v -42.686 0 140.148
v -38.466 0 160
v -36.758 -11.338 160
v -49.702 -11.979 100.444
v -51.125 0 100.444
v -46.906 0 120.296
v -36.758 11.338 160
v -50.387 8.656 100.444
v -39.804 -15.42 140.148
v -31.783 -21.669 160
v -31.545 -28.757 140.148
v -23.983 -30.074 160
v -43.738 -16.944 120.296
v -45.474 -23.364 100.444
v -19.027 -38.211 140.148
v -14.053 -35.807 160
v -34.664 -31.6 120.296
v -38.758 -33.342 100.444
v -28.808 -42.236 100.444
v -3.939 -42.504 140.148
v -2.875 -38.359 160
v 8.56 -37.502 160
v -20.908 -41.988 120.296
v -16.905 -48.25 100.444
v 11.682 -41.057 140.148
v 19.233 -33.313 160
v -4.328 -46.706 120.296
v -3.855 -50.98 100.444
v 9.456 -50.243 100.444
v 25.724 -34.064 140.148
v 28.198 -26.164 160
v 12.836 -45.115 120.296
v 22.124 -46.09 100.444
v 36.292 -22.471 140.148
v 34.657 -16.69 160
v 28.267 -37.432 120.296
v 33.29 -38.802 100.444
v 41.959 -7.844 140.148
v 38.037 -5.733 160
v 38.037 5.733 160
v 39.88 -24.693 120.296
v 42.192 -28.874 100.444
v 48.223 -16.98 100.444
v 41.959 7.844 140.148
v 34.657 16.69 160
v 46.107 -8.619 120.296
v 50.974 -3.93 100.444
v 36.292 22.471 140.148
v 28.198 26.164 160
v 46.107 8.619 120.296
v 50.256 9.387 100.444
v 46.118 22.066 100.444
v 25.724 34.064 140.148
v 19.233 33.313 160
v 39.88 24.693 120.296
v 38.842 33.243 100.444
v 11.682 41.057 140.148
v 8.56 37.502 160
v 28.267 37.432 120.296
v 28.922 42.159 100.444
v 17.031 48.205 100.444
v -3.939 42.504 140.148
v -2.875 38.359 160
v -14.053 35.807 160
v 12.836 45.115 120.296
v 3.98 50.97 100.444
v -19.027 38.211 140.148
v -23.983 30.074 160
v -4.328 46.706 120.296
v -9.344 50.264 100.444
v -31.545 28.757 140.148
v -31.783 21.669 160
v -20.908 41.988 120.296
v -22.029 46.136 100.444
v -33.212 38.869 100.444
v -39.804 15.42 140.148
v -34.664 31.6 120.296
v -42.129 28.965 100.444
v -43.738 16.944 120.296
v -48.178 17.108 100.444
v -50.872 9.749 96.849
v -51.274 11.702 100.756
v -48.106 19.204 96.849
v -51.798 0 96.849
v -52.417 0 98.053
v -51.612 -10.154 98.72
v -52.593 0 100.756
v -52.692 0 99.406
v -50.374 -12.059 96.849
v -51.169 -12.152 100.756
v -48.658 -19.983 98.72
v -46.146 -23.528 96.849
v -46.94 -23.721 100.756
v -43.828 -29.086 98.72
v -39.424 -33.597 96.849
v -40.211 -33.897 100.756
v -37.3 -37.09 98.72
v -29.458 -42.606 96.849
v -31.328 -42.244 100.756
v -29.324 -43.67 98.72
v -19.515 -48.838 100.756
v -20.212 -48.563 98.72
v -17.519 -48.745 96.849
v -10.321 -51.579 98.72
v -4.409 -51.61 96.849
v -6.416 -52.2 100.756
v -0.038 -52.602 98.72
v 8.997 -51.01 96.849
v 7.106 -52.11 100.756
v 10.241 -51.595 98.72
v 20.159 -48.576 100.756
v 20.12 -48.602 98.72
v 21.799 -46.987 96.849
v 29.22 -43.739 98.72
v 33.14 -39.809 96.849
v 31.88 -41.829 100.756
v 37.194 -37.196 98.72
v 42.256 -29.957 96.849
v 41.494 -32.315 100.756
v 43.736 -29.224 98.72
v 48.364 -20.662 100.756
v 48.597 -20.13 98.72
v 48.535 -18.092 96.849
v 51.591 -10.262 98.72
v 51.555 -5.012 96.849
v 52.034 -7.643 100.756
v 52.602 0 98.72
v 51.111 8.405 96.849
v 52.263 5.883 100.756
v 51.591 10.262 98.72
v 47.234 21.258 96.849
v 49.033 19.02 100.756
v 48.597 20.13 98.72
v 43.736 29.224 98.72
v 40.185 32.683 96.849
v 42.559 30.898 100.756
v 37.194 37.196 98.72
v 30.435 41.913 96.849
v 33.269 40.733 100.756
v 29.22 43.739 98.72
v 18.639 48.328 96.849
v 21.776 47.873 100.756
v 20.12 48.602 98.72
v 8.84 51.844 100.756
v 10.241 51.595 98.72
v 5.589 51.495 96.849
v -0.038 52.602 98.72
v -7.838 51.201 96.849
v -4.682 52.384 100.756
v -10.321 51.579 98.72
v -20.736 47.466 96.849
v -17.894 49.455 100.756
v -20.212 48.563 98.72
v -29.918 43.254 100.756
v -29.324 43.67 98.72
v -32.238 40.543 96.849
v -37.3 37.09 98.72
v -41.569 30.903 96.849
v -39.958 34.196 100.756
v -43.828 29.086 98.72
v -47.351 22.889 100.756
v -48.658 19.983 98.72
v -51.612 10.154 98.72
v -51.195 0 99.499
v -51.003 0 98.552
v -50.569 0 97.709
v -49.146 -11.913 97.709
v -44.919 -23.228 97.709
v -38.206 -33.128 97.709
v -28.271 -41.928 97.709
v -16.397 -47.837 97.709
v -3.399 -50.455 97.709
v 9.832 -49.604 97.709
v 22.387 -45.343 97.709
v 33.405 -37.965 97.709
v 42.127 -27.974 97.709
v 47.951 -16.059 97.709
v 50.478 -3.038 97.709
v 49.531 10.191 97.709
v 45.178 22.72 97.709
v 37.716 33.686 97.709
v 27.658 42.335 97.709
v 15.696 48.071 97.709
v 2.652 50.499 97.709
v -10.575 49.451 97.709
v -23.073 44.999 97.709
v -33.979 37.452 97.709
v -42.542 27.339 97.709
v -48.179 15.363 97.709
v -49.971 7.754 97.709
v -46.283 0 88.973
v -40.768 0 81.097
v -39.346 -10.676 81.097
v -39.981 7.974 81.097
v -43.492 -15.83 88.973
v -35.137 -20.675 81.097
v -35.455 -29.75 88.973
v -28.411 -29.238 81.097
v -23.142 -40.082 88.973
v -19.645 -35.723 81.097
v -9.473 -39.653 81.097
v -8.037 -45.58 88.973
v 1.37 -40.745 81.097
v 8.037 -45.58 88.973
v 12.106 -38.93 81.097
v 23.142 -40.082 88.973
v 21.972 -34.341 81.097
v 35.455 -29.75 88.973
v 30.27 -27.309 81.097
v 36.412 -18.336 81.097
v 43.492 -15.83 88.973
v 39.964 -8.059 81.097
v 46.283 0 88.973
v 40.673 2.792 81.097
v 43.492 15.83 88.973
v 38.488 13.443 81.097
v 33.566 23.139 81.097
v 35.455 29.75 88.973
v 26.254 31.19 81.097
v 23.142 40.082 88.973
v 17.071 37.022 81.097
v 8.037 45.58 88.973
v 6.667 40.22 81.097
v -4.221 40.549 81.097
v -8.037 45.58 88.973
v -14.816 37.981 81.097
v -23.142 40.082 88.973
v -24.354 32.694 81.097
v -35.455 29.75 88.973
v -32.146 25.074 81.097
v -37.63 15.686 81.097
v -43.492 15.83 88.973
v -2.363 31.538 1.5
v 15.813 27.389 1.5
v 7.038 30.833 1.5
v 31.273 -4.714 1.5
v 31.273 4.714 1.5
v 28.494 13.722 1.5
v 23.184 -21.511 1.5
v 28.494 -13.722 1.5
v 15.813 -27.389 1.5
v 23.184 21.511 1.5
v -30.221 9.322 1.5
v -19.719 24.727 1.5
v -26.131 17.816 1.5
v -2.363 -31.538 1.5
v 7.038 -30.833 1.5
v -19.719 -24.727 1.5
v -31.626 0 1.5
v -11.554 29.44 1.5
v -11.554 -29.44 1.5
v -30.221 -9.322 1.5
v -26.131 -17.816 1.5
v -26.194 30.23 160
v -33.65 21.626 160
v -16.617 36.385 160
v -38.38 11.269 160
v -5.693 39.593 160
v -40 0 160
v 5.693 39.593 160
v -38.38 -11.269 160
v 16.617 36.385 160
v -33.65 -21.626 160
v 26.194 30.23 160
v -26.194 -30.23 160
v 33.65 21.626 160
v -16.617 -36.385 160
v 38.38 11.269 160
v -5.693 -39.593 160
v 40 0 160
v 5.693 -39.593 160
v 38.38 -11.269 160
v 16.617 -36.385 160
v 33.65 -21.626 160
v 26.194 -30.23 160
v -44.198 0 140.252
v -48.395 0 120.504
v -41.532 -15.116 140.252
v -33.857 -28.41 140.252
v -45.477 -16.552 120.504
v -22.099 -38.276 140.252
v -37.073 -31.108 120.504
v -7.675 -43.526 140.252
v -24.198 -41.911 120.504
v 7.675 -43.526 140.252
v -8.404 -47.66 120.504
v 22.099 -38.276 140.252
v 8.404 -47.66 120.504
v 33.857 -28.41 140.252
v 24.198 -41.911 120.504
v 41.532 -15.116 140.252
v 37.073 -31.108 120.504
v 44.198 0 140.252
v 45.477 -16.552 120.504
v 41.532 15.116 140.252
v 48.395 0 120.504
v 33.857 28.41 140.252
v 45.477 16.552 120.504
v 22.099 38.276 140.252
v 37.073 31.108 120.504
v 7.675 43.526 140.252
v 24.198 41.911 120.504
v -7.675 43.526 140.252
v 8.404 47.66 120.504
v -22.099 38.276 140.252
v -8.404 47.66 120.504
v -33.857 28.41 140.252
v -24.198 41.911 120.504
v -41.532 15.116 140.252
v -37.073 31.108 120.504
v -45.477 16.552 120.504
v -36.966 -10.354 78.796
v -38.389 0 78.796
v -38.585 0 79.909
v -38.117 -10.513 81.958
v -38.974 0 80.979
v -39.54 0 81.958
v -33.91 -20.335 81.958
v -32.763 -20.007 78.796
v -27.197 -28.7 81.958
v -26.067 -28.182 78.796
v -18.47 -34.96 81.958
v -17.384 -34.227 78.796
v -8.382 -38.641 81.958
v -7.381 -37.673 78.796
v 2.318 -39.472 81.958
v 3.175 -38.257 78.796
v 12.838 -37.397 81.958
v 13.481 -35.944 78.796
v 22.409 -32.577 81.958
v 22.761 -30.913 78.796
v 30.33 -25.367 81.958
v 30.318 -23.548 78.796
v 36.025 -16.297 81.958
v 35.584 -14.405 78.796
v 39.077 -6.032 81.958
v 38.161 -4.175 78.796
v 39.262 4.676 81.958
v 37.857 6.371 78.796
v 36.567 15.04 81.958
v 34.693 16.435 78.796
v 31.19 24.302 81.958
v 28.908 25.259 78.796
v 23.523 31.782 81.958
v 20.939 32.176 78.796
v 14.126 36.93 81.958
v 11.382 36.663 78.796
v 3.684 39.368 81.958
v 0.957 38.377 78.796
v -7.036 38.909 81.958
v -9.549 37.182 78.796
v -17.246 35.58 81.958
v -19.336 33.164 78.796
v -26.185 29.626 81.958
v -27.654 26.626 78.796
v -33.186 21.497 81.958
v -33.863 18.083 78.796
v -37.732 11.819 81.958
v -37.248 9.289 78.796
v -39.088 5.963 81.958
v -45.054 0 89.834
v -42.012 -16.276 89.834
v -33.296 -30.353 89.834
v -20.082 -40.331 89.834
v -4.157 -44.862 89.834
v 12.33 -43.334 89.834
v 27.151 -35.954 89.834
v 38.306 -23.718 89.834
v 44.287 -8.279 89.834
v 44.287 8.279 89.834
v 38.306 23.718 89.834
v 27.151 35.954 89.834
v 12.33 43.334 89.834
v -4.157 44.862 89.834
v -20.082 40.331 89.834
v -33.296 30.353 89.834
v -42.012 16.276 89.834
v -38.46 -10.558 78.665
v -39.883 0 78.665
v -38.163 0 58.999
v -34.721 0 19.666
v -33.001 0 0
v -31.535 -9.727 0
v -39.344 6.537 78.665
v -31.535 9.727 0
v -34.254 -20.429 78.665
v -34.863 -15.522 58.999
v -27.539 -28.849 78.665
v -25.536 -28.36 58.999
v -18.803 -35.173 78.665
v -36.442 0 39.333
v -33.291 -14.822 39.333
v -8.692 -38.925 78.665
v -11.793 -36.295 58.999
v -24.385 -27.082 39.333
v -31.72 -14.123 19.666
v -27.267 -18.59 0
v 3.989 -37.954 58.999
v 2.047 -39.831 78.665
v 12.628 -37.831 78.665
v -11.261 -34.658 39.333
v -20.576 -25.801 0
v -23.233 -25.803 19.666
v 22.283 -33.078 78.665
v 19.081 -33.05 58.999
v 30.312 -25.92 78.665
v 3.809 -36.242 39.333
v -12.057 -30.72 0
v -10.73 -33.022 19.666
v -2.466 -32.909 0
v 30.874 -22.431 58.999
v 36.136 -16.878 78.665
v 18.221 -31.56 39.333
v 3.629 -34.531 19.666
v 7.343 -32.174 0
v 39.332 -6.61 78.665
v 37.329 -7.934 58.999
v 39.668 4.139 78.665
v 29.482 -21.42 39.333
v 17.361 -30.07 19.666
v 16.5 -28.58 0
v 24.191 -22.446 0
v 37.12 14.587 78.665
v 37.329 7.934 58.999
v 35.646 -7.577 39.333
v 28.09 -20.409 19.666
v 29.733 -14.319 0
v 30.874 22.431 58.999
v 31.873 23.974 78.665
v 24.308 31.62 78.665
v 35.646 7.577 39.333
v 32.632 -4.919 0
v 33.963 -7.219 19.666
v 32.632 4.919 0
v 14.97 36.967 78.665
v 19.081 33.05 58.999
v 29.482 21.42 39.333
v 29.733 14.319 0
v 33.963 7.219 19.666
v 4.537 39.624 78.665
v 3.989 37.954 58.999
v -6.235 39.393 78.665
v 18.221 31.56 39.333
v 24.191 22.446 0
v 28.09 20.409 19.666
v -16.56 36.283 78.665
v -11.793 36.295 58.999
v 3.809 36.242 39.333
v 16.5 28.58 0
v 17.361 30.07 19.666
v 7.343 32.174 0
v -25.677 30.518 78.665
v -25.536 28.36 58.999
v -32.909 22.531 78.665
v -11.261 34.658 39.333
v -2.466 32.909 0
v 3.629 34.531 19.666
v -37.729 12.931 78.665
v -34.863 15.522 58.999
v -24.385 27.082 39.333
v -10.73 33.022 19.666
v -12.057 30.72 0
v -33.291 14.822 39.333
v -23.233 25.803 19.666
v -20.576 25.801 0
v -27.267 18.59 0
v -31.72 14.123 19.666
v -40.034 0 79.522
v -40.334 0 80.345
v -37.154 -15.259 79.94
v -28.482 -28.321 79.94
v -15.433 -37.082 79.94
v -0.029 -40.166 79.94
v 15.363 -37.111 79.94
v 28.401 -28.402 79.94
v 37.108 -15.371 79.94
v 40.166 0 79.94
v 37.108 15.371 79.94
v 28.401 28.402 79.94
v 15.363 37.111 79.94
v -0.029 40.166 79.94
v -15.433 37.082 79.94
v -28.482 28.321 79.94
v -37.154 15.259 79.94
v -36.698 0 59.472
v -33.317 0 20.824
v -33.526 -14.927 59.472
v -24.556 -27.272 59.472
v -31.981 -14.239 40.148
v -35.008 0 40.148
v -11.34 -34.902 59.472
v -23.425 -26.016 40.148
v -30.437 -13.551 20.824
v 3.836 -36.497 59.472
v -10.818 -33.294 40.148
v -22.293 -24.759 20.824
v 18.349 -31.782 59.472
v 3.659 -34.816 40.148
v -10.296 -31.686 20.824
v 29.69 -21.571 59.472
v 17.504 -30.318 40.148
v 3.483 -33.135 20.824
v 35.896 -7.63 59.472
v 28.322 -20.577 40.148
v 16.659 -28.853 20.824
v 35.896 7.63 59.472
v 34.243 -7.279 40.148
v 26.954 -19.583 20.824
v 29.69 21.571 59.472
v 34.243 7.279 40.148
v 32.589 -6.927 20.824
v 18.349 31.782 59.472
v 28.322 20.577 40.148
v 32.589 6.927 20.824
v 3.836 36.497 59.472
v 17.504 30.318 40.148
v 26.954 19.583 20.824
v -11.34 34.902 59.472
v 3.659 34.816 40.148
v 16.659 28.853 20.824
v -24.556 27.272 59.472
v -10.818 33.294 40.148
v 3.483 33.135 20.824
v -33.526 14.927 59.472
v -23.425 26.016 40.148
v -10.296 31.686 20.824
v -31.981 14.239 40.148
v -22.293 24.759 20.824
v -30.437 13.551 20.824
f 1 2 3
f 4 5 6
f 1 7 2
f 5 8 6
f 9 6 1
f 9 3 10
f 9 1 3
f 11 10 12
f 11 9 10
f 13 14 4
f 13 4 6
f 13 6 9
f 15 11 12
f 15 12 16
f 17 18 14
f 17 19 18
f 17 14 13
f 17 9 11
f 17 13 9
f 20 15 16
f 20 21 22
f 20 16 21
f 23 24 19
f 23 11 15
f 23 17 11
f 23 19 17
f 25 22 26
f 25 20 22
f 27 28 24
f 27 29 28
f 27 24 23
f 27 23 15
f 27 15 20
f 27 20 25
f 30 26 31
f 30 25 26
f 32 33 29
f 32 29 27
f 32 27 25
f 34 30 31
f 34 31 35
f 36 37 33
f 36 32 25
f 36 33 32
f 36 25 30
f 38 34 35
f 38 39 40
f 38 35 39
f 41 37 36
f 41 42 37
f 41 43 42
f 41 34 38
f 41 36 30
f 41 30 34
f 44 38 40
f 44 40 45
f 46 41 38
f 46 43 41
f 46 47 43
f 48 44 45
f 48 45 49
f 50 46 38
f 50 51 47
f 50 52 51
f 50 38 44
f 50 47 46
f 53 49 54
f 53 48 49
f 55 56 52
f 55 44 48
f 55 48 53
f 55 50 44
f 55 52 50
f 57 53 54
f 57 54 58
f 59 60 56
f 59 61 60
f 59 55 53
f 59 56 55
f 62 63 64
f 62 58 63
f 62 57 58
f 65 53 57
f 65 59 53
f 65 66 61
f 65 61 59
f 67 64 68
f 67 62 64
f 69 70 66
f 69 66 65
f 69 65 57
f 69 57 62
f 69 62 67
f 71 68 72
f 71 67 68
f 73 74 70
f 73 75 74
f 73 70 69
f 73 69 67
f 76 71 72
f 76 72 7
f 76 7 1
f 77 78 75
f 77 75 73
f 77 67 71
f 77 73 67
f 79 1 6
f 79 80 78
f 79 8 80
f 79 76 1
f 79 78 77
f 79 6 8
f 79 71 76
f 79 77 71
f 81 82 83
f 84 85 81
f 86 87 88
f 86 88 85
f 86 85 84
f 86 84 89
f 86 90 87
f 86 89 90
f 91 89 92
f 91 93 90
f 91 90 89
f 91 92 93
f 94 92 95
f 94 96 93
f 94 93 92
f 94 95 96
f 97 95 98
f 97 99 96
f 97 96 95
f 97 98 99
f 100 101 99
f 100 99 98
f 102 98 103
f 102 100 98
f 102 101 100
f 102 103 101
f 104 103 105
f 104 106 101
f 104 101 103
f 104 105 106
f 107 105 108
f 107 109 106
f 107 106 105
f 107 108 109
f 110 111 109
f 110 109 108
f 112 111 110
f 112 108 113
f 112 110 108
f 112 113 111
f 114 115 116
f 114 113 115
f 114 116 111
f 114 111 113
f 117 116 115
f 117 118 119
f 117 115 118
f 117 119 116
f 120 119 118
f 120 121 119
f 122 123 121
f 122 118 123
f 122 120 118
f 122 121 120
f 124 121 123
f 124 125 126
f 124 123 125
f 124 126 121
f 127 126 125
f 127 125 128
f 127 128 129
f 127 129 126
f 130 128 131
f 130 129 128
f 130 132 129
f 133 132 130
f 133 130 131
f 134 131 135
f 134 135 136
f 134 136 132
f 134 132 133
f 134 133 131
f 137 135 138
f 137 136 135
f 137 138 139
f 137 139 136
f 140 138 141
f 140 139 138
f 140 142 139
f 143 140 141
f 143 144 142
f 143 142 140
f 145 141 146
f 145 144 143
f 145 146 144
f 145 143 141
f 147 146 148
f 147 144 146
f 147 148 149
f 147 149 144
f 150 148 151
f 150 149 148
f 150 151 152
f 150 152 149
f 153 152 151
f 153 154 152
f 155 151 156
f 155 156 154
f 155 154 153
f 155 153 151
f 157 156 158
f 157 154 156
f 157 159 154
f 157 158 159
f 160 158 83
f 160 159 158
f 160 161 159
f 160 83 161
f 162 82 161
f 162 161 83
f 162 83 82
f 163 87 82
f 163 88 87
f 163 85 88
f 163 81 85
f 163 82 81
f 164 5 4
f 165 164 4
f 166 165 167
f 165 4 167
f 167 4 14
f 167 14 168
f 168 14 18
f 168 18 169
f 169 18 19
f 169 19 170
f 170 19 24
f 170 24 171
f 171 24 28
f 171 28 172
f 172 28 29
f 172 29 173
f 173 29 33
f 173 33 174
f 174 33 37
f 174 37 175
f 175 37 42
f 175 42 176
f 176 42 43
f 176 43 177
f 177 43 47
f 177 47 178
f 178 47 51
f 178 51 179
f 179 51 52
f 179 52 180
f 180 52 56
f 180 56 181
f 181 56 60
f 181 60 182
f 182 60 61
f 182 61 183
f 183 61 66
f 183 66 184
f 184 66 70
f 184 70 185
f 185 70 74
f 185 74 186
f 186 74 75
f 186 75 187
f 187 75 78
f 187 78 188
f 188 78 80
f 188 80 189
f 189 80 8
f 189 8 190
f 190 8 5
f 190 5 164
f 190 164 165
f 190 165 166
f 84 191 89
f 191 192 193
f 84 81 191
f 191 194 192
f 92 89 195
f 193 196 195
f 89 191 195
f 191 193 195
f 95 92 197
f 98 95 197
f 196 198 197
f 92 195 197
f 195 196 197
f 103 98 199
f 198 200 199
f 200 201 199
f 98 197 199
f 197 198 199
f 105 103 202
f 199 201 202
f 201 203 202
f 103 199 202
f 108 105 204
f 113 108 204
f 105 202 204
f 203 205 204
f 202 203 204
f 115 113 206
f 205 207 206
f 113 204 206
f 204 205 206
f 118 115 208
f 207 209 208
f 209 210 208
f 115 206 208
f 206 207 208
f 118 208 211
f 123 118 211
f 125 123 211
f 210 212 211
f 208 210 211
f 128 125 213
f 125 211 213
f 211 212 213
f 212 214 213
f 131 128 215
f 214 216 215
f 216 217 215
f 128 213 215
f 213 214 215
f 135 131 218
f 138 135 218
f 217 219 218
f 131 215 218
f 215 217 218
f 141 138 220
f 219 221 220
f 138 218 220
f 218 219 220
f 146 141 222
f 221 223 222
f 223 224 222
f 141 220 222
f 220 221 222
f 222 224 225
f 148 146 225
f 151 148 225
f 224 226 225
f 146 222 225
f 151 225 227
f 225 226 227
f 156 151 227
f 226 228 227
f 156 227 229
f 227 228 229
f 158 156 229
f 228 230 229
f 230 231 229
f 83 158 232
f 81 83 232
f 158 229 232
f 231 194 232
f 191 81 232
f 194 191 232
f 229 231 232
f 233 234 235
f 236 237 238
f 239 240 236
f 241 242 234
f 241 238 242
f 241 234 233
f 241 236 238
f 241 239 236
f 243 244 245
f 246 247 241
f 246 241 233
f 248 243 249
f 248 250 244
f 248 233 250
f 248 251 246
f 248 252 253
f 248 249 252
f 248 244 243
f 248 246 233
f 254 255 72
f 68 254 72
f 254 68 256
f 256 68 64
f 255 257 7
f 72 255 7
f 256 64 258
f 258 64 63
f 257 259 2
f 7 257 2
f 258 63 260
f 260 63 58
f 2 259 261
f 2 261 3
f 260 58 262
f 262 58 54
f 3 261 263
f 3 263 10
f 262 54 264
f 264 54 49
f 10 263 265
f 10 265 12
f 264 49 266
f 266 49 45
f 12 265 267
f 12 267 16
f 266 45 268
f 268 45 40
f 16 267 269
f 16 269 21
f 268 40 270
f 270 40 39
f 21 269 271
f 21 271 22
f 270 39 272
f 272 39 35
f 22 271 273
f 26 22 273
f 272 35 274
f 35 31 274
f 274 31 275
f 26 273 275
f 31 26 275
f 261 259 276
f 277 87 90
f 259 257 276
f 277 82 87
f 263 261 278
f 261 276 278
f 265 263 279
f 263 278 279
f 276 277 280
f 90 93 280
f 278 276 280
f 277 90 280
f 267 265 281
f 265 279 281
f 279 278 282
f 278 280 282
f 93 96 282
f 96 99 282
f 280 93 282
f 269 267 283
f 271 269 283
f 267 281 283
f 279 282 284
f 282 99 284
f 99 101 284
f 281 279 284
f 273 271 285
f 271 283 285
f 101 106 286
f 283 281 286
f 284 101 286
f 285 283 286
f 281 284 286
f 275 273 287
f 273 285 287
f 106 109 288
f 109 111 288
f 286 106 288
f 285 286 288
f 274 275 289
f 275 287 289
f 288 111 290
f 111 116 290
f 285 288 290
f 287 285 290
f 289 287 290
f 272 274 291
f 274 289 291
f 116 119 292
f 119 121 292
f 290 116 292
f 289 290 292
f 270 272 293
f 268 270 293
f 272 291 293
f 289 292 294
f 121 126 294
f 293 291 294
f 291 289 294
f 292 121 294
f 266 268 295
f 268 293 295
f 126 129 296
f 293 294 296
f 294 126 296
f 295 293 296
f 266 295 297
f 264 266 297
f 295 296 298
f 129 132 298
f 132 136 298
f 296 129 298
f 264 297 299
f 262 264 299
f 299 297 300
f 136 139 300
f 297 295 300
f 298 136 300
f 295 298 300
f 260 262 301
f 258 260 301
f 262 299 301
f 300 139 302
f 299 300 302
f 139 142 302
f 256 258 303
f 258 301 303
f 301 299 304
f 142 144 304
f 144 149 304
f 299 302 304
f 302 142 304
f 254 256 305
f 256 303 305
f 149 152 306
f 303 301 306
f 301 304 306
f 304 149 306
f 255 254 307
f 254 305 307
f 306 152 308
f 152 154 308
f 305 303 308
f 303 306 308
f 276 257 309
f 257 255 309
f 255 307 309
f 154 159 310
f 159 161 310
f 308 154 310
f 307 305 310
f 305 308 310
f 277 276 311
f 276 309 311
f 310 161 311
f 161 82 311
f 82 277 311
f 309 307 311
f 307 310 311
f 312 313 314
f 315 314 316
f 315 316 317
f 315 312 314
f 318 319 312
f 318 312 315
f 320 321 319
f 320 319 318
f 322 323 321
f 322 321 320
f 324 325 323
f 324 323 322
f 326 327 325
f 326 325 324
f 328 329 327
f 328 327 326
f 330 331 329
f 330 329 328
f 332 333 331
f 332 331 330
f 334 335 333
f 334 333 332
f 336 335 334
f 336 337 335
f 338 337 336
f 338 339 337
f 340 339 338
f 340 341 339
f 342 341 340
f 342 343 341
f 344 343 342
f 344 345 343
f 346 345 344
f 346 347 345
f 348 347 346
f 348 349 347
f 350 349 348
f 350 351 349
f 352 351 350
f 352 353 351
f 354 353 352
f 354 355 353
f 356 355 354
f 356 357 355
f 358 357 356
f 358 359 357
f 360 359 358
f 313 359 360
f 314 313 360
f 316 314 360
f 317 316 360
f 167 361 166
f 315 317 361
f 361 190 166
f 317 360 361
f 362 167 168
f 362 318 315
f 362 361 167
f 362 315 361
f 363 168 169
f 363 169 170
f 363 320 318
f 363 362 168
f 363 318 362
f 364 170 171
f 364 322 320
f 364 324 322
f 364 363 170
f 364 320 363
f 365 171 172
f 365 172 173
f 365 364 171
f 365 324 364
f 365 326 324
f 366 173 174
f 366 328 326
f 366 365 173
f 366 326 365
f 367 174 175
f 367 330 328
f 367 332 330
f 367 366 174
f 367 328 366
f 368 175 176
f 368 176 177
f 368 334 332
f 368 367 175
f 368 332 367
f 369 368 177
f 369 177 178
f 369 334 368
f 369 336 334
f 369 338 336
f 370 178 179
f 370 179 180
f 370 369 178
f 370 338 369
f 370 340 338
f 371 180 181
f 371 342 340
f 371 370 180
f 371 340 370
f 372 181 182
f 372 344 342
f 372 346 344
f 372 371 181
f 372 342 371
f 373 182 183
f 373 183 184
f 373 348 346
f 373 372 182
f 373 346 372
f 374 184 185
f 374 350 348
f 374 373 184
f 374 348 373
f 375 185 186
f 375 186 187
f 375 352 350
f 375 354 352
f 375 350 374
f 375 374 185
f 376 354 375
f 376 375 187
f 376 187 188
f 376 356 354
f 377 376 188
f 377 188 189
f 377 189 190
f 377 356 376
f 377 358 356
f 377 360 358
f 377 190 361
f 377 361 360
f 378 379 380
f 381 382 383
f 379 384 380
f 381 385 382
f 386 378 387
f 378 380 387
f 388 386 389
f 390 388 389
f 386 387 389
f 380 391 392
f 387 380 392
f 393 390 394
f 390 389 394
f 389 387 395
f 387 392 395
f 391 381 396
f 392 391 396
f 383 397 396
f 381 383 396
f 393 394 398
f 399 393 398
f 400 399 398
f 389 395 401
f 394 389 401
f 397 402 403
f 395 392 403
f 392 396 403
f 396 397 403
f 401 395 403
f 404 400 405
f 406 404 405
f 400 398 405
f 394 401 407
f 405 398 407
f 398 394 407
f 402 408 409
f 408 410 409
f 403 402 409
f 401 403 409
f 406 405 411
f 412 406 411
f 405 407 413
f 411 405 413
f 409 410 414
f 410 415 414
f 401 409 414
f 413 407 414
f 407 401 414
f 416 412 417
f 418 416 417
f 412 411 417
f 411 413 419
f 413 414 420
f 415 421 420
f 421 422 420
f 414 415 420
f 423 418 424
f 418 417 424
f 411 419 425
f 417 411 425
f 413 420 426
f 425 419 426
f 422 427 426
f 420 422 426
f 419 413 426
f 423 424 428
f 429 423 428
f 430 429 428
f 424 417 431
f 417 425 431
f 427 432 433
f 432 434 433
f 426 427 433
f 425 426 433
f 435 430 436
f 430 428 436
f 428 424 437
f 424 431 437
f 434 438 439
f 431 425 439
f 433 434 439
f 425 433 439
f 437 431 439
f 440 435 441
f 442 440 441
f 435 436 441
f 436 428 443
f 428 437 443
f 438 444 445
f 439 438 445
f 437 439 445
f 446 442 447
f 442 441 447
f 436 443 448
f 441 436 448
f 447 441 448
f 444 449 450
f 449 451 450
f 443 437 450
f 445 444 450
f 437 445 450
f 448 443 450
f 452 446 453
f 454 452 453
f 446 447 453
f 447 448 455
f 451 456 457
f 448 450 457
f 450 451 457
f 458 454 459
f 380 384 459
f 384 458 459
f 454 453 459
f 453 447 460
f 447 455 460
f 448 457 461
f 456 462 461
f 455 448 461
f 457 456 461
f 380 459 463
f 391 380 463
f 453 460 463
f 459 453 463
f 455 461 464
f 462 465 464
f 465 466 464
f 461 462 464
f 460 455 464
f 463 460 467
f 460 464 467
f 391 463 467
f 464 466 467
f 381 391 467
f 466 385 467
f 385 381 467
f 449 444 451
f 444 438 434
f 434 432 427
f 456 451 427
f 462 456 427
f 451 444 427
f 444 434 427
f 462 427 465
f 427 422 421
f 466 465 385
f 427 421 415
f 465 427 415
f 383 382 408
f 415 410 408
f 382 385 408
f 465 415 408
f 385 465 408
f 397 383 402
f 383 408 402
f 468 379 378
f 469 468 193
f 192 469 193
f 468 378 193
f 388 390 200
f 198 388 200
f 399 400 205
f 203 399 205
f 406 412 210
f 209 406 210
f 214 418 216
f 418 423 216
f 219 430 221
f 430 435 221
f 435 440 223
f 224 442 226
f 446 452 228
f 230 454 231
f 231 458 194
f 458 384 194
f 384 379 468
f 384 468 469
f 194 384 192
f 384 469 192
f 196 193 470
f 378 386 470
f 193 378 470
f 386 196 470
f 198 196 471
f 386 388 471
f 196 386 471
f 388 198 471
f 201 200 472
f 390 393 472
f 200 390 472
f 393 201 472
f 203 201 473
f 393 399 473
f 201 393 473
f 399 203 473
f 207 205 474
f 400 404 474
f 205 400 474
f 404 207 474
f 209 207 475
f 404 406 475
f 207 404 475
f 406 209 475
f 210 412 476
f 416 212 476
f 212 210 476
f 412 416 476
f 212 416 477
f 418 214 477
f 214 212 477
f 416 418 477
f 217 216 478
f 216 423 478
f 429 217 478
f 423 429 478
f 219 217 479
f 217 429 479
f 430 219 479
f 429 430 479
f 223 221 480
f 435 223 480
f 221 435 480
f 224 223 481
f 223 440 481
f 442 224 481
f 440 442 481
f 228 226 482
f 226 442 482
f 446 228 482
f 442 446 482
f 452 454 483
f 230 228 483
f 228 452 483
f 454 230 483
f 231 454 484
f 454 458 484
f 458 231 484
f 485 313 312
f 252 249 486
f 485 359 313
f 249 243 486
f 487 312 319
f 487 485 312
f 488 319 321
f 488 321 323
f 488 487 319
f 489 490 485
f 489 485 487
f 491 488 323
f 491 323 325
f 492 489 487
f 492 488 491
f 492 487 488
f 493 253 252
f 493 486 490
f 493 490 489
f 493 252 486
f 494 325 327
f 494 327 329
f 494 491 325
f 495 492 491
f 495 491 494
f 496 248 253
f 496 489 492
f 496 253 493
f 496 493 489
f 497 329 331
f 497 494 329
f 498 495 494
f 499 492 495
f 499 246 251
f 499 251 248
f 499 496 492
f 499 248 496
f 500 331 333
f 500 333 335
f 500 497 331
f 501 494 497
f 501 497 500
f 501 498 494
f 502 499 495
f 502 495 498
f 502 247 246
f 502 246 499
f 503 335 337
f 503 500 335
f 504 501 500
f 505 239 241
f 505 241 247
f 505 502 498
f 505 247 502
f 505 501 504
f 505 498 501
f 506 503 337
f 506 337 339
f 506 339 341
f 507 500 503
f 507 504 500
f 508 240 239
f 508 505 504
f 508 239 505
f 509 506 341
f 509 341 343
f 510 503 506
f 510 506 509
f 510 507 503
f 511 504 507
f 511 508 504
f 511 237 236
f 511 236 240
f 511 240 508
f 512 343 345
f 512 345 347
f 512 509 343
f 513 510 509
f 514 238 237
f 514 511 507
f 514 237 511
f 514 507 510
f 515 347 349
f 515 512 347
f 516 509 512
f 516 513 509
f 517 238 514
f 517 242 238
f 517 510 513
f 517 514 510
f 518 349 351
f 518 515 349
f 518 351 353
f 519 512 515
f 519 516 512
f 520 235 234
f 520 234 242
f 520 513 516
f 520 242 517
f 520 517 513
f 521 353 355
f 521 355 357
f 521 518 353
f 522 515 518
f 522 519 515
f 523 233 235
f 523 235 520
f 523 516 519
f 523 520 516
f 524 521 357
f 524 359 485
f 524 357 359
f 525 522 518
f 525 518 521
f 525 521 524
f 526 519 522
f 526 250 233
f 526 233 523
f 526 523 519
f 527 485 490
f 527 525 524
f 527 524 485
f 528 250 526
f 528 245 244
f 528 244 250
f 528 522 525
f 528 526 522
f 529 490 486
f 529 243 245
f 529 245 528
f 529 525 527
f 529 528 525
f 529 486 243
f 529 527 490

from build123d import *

# Parameters (mm, degrees)
F2_R = 5
F3_T = -1.5


with BuildPart() as f1:
    # F0 (on Front) → F1 (revolve)
    with BuildSketch(Plane.XZ):
        Polygon((-40, 80), (-33.0009069179, 0), (0, 0), (0, 160), (-40, 160), (-53.0446591225, 98.6297039244), align=None)
    revolve(axis=Axis((0, 0, 80), (0, 0, 1)))

    # F2
    f2_edges = [f1.edges().sort_by_distance(p)[0] for p in [
        (53.044659, 0, 98.629704),
        (40, 0, 80),
    ]]
    fillet(f2_edges, radius=F2_R)

    # F3
    f3_openings = [f1.faces().sort_by_distance(p)[0] for p in [
        (0, 0, 160),
    ]]
    offset(amount=F3_T, openings=f3_openings)


solid = f1.part
